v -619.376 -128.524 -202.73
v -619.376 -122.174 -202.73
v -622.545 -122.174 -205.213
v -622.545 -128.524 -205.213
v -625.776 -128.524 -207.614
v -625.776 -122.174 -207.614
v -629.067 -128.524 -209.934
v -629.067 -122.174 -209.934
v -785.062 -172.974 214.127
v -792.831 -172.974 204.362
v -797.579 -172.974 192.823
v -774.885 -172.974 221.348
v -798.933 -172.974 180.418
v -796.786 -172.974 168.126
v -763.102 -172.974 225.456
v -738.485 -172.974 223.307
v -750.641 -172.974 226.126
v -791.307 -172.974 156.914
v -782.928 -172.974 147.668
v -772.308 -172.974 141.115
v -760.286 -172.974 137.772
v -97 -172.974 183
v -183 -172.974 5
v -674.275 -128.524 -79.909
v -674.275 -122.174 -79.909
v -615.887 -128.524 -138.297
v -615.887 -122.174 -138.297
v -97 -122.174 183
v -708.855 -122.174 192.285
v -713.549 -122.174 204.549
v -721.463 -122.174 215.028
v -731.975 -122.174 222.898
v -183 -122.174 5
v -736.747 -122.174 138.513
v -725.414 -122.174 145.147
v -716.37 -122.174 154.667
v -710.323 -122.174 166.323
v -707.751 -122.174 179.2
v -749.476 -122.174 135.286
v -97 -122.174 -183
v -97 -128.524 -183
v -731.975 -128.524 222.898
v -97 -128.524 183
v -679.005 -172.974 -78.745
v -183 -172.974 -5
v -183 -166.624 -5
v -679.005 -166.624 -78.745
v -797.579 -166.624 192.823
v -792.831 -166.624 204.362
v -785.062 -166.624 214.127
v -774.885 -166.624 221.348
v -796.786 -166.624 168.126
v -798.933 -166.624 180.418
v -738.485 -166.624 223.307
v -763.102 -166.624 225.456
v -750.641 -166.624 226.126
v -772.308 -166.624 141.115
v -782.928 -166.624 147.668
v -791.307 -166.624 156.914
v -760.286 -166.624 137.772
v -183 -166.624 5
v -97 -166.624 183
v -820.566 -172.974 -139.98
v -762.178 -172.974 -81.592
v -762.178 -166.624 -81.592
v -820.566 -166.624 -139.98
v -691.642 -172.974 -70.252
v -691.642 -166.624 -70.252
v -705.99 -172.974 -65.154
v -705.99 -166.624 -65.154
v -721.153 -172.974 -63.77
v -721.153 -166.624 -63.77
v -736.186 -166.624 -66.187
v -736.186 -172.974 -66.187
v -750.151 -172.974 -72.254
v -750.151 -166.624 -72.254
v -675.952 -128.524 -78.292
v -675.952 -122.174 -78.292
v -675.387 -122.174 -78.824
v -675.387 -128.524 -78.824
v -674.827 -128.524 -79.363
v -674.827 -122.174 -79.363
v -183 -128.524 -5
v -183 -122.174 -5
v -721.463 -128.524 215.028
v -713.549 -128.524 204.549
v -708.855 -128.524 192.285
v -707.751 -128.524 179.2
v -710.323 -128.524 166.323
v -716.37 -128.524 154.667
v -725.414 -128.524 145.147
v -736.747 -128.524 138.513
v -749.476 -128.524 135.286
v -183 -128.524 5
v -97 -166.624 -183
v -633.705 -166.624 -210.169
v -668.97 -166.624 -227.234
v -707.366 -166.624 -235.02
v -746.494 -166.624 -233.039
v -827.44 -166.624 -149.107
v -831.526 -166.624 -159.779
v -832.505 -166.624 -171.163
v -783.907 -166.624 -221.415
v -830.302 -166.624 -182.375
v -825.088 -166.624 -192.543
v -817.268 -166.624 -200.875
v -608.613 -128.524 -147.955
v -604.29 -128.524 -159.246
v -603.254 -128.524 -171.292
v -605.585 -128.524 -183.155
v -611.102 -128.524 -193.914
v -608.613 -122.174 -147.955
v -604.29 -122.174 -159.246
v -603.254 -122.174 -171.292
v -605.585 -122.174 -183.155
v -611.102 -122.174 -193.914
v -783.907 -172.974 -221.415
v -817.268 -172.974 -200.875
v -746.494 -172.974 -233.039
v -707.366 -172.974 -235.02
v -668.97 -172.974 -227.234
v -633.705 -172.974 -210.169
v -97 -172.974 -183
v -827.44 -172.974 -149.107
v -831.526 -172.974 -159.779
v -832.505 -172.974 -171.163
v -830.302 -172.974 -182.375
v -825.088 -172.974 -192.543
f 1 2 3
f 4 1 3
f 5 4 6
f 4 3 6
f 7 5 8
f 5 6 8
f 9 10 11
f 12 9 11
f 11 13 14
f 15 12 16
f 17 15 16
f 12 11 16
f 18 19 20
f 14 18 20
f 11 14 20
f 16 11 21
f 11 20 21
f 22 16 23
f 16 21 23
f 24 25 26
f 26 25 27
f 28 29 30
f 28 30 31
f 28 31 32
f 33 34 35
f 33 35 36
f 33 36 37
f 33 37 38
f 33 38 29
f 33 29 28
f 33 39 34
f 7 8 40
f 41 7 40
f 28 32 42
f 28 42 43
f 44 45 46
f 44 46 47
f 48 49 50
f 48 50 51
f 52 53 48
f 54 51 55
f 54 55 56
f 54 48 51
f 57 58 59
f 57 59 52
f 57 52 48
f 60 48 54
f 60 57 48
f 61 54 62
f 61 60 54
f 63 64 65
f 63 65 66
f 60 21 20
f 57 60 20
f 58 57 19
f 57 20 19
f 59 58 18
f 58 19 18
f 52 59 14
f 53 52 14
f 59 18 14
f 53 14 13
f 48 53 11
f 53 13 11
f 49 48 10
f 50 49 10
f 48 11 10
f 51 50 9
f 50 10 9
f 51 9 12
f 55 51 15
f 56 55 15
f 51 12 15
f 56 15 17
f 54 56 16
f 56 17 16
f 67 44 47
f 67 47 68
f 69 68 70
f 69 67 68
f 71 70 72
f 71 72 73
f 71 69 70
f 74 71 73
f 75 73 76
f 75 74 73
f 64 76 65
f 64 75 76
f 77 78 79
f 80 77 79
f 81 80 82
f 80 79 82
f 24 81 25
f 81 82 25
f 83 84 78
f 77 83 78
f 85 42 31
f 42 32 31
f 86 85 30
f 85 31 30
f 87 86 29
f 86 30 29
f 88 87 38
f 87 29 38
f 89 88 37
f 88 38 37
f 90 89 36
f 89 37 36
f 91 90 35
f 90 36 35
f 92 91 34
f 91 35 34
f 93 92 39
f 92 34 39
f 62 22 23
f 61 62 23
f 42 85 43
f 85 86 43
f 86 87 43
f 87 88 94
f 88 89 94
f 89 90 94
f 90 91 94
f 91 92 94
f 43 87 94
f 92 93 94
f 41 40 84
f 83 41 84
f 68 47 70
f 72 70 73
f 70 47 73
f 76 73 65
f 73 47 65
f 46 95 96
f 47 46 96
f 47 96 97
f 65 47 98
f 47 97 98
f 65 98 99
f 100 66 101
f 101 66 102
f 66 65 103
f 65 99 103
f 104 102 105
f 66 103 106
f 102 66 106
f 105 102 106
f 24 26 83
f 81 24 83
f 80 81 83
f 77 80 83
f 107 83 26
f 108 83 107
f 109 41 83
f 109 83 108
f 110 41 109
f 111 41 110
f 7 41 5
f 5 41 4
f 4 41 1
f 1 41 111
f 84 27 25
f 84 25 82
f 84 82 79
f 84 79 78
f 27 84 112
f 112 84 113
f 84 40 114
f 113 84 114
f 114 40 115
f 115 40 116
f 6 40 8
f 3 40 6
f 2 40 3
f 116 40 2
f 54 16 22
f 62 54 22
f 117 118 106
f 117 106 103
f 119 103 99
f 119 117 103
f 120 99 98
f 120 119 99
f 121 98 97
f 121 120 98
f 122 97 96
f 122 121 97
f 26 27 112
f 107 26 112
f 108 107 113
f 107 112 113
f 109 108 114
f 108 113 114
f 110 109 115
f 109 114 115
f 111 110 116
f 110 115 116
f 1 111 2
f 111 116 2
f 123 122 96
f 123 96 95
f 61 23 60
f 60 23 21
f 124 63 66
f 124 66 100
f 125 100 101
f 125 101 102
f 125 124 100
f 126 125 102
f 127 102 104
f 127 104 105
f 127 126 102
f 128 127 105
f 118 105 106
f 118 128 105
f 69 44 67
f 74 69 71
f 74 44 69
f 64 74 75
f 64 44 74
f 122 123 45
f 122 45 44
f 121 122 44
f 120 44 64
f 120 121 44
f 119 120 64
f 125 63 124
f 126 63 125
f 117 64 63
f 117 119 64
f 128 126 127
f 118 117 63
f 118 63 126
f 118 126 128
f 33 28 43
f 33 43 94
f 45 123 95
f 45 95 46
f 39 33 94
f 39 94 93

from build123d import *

# Parameters (mm, degrees)
BOSS_EXTRUDE1_START   = -172.974
BOSS_EXTRUDE1_DEPTH   = 6.35
BOSS_EXTRUDE1_2_DEPTH = 6.35
BOSS_EXTRUDE2_START   = -122.174
BOSS_EXTRUDE2_DEPTH   = 6.35
BOSS_EXTRUDE2_2_DEPTH = 6.35
SKETCH3_R             = 46.83
CUT_EXTRUDE2_DEPTH    = 883.340554687


with BuildPart() as part:
    # Sketch1 → Boss-Extrude1 (new body)
    with BuildSketch(Plane(origin=(0, 0, 0), x_dir=(1, 0, 0), z_dir=(0, 1, 0)).offset(BOSS_EXTRUDE1_START)):
        with BuildLine():
            Line((-97, 183), (-183, 5))
            Line((-183, 5), (-679.005377884, 78.745496881))
            ThreePointArc((-679.005377884, 78.745496881), (-721.152914741, 63.770418633), (-762.17817844, 81.591629872))
            Line((-762.17817844, 81.591629872), (-820.56615944, 139.979610872))
            ThreePointArc((-820.56615944, 139.979610872), (-832.505230927, 171.163078474), (-817.268436033, 200.874863358))
            ThreePointArc((-817.268436033, 200.874863358), (-726.992188174, 235.256713622), (-633.705018706, 210.16853777))
            Line((-633.705018706, 210.16853777), (-97, 183))
        make_face()
    extrude(amount=BOSS_EXTRUDE1_DEPTH)


with BuildPart() as body_2:
    # Sketch1 → Boss-Extrude1 2 (new body)
    with BuildSketch(Plane(origin=(0, 0, 0), x_dir=(1, 0, 0), z_dir=(0, 1, 0)).offset(BOSS_EXTRUDE1_START)):
        with BuildLine():
            Line((-97, -183), (-183, -5))
            Line((-183, -5), (-760.286009912, -137.771927086))
            ThreePointArc((-760.286009912, -137.771927086), (-797.579364145, -192.822794387), (-738.485290066, -223.306932381))
            Line((-738.485290066, -223.306932381), (-97, -183))
        make_face()
    extrude(amount=BOSS_EXTRUDE1_2_DEPTH)


with BuildPart() as body_3:
    # Sketch1<2> → Boss-Extrude2 (new body)
    with BuildSketch(Plane(origin=(0, 0, 0), x_dir=(1, 0, 0), z_dir=(0, 1, 0)).offset(BOSS_EXTRUDE2_START)):
        with BuildLine():
            Line((-97, 183), (-183, 5))
            Line((-183, 5), (-679.005377884, 78.745496881))
            ThreePointArc((-679.005377884, 78.745496881), (-721.152914741, 63.770418633), (-762.17817844, 81.591629872))
            Line((-762.17817844, 81.591629872), (-820.56615944, 139.979610872))
            ThreePointArc((-820.56615944, 139.979610872), (-832.505230927, 171.163078474), (-817.268436033, 200.874863358))
            ThreePointArc((-817.268436033, 200.874863358), (-726.992188174, 235.256713622), (-633.705018706, 210.16853777))
            Line((-633.705018706, 210.16853777), (-97, 183))
        make_face()
    extrude(amount=-BOSS_EXTRUDE2_DEPTH)


with BuildPart() as body_4:
    # Sketch1<2> → Boss-Extrude2 2 (new body)
    with BuildSketch(Plane(origin=(0, 0, 0), x_dir=(1, 0, 0), z_dir=(0, 1, 0)).offset(BOSS_EXTRUDE2_START)):
        with BuildLine():
            Line((-97, -183), (-183, -5))
            Line((-183, -5), (-760.286009912, -137.771927086))
            ThreePointArc((-760.286009912, -137.771927086), (-797.579364145, -192.822794387), (-738.485290066, -223.306932381))
            Line((-738.485290066, -223.306932381), (-97, -183))
        make_face()
    extrude(amount=-BOSS_EXTRUDE2_2_DEPTH)


with BuildPart() as cut_extrude2_tool:
    # Sketch3 → Cut-Extrude2 (new, through all)
    with BuildSketch(Plane(origin=(0, 0, 0), x_dir=(1, 0, 0), z_dir=(0, 1, 0))):
        with Locations((-754.506388348, -181.844577047)):
            Circle(SKETCH3_R)
        with BuildLine():
            Line((-674.274642491, 79.908715733), (-615.886661491, 138.296696732))
            ThreePointArc((-615.886661491, 138.296696732), (-603.25398635, 171.291776492), (-619.37596705, 202.729675721))
            ThreePointArc((-619.37596705, 202.729675721), (-719.067867535, 237.83718636), (-818.75976802, 202.729675721))
            ThreePointArc((-818.75976802, 202.729675721), (-834.88174872, 171.291776492), (-822.249073579, 138.296696732))
            Line((-822.249073579, 138.296696732), (-763.86109258, 79.908715733))
            ThreePointArc((-763.86109258, 79.908715733), (-719.067867535, 61.354754417), (-674.274642491, 79.908715733))
        make_face()
    extrude(amount=-CUT_EXTRUDE2_DEPTH)


with BuildPart() as body_4_1:
    add(body_4.part)

    # Cut-Extrude2: cut by cut_extrude2_tool
    add(cut_extrude2_tool.part, mode=Mode.SUBTRACT)


with BuildPart() as body_3_1:
    add(body_3.part)

    # Cut-Extrude2: cut by cut_extrude2_tool
    add(cut_extrude2_tool.part, mode=Mode.SUBTRACT)


solid = Compound([part.part, body_2.part, body_4_1.part, body_3_1.part])
